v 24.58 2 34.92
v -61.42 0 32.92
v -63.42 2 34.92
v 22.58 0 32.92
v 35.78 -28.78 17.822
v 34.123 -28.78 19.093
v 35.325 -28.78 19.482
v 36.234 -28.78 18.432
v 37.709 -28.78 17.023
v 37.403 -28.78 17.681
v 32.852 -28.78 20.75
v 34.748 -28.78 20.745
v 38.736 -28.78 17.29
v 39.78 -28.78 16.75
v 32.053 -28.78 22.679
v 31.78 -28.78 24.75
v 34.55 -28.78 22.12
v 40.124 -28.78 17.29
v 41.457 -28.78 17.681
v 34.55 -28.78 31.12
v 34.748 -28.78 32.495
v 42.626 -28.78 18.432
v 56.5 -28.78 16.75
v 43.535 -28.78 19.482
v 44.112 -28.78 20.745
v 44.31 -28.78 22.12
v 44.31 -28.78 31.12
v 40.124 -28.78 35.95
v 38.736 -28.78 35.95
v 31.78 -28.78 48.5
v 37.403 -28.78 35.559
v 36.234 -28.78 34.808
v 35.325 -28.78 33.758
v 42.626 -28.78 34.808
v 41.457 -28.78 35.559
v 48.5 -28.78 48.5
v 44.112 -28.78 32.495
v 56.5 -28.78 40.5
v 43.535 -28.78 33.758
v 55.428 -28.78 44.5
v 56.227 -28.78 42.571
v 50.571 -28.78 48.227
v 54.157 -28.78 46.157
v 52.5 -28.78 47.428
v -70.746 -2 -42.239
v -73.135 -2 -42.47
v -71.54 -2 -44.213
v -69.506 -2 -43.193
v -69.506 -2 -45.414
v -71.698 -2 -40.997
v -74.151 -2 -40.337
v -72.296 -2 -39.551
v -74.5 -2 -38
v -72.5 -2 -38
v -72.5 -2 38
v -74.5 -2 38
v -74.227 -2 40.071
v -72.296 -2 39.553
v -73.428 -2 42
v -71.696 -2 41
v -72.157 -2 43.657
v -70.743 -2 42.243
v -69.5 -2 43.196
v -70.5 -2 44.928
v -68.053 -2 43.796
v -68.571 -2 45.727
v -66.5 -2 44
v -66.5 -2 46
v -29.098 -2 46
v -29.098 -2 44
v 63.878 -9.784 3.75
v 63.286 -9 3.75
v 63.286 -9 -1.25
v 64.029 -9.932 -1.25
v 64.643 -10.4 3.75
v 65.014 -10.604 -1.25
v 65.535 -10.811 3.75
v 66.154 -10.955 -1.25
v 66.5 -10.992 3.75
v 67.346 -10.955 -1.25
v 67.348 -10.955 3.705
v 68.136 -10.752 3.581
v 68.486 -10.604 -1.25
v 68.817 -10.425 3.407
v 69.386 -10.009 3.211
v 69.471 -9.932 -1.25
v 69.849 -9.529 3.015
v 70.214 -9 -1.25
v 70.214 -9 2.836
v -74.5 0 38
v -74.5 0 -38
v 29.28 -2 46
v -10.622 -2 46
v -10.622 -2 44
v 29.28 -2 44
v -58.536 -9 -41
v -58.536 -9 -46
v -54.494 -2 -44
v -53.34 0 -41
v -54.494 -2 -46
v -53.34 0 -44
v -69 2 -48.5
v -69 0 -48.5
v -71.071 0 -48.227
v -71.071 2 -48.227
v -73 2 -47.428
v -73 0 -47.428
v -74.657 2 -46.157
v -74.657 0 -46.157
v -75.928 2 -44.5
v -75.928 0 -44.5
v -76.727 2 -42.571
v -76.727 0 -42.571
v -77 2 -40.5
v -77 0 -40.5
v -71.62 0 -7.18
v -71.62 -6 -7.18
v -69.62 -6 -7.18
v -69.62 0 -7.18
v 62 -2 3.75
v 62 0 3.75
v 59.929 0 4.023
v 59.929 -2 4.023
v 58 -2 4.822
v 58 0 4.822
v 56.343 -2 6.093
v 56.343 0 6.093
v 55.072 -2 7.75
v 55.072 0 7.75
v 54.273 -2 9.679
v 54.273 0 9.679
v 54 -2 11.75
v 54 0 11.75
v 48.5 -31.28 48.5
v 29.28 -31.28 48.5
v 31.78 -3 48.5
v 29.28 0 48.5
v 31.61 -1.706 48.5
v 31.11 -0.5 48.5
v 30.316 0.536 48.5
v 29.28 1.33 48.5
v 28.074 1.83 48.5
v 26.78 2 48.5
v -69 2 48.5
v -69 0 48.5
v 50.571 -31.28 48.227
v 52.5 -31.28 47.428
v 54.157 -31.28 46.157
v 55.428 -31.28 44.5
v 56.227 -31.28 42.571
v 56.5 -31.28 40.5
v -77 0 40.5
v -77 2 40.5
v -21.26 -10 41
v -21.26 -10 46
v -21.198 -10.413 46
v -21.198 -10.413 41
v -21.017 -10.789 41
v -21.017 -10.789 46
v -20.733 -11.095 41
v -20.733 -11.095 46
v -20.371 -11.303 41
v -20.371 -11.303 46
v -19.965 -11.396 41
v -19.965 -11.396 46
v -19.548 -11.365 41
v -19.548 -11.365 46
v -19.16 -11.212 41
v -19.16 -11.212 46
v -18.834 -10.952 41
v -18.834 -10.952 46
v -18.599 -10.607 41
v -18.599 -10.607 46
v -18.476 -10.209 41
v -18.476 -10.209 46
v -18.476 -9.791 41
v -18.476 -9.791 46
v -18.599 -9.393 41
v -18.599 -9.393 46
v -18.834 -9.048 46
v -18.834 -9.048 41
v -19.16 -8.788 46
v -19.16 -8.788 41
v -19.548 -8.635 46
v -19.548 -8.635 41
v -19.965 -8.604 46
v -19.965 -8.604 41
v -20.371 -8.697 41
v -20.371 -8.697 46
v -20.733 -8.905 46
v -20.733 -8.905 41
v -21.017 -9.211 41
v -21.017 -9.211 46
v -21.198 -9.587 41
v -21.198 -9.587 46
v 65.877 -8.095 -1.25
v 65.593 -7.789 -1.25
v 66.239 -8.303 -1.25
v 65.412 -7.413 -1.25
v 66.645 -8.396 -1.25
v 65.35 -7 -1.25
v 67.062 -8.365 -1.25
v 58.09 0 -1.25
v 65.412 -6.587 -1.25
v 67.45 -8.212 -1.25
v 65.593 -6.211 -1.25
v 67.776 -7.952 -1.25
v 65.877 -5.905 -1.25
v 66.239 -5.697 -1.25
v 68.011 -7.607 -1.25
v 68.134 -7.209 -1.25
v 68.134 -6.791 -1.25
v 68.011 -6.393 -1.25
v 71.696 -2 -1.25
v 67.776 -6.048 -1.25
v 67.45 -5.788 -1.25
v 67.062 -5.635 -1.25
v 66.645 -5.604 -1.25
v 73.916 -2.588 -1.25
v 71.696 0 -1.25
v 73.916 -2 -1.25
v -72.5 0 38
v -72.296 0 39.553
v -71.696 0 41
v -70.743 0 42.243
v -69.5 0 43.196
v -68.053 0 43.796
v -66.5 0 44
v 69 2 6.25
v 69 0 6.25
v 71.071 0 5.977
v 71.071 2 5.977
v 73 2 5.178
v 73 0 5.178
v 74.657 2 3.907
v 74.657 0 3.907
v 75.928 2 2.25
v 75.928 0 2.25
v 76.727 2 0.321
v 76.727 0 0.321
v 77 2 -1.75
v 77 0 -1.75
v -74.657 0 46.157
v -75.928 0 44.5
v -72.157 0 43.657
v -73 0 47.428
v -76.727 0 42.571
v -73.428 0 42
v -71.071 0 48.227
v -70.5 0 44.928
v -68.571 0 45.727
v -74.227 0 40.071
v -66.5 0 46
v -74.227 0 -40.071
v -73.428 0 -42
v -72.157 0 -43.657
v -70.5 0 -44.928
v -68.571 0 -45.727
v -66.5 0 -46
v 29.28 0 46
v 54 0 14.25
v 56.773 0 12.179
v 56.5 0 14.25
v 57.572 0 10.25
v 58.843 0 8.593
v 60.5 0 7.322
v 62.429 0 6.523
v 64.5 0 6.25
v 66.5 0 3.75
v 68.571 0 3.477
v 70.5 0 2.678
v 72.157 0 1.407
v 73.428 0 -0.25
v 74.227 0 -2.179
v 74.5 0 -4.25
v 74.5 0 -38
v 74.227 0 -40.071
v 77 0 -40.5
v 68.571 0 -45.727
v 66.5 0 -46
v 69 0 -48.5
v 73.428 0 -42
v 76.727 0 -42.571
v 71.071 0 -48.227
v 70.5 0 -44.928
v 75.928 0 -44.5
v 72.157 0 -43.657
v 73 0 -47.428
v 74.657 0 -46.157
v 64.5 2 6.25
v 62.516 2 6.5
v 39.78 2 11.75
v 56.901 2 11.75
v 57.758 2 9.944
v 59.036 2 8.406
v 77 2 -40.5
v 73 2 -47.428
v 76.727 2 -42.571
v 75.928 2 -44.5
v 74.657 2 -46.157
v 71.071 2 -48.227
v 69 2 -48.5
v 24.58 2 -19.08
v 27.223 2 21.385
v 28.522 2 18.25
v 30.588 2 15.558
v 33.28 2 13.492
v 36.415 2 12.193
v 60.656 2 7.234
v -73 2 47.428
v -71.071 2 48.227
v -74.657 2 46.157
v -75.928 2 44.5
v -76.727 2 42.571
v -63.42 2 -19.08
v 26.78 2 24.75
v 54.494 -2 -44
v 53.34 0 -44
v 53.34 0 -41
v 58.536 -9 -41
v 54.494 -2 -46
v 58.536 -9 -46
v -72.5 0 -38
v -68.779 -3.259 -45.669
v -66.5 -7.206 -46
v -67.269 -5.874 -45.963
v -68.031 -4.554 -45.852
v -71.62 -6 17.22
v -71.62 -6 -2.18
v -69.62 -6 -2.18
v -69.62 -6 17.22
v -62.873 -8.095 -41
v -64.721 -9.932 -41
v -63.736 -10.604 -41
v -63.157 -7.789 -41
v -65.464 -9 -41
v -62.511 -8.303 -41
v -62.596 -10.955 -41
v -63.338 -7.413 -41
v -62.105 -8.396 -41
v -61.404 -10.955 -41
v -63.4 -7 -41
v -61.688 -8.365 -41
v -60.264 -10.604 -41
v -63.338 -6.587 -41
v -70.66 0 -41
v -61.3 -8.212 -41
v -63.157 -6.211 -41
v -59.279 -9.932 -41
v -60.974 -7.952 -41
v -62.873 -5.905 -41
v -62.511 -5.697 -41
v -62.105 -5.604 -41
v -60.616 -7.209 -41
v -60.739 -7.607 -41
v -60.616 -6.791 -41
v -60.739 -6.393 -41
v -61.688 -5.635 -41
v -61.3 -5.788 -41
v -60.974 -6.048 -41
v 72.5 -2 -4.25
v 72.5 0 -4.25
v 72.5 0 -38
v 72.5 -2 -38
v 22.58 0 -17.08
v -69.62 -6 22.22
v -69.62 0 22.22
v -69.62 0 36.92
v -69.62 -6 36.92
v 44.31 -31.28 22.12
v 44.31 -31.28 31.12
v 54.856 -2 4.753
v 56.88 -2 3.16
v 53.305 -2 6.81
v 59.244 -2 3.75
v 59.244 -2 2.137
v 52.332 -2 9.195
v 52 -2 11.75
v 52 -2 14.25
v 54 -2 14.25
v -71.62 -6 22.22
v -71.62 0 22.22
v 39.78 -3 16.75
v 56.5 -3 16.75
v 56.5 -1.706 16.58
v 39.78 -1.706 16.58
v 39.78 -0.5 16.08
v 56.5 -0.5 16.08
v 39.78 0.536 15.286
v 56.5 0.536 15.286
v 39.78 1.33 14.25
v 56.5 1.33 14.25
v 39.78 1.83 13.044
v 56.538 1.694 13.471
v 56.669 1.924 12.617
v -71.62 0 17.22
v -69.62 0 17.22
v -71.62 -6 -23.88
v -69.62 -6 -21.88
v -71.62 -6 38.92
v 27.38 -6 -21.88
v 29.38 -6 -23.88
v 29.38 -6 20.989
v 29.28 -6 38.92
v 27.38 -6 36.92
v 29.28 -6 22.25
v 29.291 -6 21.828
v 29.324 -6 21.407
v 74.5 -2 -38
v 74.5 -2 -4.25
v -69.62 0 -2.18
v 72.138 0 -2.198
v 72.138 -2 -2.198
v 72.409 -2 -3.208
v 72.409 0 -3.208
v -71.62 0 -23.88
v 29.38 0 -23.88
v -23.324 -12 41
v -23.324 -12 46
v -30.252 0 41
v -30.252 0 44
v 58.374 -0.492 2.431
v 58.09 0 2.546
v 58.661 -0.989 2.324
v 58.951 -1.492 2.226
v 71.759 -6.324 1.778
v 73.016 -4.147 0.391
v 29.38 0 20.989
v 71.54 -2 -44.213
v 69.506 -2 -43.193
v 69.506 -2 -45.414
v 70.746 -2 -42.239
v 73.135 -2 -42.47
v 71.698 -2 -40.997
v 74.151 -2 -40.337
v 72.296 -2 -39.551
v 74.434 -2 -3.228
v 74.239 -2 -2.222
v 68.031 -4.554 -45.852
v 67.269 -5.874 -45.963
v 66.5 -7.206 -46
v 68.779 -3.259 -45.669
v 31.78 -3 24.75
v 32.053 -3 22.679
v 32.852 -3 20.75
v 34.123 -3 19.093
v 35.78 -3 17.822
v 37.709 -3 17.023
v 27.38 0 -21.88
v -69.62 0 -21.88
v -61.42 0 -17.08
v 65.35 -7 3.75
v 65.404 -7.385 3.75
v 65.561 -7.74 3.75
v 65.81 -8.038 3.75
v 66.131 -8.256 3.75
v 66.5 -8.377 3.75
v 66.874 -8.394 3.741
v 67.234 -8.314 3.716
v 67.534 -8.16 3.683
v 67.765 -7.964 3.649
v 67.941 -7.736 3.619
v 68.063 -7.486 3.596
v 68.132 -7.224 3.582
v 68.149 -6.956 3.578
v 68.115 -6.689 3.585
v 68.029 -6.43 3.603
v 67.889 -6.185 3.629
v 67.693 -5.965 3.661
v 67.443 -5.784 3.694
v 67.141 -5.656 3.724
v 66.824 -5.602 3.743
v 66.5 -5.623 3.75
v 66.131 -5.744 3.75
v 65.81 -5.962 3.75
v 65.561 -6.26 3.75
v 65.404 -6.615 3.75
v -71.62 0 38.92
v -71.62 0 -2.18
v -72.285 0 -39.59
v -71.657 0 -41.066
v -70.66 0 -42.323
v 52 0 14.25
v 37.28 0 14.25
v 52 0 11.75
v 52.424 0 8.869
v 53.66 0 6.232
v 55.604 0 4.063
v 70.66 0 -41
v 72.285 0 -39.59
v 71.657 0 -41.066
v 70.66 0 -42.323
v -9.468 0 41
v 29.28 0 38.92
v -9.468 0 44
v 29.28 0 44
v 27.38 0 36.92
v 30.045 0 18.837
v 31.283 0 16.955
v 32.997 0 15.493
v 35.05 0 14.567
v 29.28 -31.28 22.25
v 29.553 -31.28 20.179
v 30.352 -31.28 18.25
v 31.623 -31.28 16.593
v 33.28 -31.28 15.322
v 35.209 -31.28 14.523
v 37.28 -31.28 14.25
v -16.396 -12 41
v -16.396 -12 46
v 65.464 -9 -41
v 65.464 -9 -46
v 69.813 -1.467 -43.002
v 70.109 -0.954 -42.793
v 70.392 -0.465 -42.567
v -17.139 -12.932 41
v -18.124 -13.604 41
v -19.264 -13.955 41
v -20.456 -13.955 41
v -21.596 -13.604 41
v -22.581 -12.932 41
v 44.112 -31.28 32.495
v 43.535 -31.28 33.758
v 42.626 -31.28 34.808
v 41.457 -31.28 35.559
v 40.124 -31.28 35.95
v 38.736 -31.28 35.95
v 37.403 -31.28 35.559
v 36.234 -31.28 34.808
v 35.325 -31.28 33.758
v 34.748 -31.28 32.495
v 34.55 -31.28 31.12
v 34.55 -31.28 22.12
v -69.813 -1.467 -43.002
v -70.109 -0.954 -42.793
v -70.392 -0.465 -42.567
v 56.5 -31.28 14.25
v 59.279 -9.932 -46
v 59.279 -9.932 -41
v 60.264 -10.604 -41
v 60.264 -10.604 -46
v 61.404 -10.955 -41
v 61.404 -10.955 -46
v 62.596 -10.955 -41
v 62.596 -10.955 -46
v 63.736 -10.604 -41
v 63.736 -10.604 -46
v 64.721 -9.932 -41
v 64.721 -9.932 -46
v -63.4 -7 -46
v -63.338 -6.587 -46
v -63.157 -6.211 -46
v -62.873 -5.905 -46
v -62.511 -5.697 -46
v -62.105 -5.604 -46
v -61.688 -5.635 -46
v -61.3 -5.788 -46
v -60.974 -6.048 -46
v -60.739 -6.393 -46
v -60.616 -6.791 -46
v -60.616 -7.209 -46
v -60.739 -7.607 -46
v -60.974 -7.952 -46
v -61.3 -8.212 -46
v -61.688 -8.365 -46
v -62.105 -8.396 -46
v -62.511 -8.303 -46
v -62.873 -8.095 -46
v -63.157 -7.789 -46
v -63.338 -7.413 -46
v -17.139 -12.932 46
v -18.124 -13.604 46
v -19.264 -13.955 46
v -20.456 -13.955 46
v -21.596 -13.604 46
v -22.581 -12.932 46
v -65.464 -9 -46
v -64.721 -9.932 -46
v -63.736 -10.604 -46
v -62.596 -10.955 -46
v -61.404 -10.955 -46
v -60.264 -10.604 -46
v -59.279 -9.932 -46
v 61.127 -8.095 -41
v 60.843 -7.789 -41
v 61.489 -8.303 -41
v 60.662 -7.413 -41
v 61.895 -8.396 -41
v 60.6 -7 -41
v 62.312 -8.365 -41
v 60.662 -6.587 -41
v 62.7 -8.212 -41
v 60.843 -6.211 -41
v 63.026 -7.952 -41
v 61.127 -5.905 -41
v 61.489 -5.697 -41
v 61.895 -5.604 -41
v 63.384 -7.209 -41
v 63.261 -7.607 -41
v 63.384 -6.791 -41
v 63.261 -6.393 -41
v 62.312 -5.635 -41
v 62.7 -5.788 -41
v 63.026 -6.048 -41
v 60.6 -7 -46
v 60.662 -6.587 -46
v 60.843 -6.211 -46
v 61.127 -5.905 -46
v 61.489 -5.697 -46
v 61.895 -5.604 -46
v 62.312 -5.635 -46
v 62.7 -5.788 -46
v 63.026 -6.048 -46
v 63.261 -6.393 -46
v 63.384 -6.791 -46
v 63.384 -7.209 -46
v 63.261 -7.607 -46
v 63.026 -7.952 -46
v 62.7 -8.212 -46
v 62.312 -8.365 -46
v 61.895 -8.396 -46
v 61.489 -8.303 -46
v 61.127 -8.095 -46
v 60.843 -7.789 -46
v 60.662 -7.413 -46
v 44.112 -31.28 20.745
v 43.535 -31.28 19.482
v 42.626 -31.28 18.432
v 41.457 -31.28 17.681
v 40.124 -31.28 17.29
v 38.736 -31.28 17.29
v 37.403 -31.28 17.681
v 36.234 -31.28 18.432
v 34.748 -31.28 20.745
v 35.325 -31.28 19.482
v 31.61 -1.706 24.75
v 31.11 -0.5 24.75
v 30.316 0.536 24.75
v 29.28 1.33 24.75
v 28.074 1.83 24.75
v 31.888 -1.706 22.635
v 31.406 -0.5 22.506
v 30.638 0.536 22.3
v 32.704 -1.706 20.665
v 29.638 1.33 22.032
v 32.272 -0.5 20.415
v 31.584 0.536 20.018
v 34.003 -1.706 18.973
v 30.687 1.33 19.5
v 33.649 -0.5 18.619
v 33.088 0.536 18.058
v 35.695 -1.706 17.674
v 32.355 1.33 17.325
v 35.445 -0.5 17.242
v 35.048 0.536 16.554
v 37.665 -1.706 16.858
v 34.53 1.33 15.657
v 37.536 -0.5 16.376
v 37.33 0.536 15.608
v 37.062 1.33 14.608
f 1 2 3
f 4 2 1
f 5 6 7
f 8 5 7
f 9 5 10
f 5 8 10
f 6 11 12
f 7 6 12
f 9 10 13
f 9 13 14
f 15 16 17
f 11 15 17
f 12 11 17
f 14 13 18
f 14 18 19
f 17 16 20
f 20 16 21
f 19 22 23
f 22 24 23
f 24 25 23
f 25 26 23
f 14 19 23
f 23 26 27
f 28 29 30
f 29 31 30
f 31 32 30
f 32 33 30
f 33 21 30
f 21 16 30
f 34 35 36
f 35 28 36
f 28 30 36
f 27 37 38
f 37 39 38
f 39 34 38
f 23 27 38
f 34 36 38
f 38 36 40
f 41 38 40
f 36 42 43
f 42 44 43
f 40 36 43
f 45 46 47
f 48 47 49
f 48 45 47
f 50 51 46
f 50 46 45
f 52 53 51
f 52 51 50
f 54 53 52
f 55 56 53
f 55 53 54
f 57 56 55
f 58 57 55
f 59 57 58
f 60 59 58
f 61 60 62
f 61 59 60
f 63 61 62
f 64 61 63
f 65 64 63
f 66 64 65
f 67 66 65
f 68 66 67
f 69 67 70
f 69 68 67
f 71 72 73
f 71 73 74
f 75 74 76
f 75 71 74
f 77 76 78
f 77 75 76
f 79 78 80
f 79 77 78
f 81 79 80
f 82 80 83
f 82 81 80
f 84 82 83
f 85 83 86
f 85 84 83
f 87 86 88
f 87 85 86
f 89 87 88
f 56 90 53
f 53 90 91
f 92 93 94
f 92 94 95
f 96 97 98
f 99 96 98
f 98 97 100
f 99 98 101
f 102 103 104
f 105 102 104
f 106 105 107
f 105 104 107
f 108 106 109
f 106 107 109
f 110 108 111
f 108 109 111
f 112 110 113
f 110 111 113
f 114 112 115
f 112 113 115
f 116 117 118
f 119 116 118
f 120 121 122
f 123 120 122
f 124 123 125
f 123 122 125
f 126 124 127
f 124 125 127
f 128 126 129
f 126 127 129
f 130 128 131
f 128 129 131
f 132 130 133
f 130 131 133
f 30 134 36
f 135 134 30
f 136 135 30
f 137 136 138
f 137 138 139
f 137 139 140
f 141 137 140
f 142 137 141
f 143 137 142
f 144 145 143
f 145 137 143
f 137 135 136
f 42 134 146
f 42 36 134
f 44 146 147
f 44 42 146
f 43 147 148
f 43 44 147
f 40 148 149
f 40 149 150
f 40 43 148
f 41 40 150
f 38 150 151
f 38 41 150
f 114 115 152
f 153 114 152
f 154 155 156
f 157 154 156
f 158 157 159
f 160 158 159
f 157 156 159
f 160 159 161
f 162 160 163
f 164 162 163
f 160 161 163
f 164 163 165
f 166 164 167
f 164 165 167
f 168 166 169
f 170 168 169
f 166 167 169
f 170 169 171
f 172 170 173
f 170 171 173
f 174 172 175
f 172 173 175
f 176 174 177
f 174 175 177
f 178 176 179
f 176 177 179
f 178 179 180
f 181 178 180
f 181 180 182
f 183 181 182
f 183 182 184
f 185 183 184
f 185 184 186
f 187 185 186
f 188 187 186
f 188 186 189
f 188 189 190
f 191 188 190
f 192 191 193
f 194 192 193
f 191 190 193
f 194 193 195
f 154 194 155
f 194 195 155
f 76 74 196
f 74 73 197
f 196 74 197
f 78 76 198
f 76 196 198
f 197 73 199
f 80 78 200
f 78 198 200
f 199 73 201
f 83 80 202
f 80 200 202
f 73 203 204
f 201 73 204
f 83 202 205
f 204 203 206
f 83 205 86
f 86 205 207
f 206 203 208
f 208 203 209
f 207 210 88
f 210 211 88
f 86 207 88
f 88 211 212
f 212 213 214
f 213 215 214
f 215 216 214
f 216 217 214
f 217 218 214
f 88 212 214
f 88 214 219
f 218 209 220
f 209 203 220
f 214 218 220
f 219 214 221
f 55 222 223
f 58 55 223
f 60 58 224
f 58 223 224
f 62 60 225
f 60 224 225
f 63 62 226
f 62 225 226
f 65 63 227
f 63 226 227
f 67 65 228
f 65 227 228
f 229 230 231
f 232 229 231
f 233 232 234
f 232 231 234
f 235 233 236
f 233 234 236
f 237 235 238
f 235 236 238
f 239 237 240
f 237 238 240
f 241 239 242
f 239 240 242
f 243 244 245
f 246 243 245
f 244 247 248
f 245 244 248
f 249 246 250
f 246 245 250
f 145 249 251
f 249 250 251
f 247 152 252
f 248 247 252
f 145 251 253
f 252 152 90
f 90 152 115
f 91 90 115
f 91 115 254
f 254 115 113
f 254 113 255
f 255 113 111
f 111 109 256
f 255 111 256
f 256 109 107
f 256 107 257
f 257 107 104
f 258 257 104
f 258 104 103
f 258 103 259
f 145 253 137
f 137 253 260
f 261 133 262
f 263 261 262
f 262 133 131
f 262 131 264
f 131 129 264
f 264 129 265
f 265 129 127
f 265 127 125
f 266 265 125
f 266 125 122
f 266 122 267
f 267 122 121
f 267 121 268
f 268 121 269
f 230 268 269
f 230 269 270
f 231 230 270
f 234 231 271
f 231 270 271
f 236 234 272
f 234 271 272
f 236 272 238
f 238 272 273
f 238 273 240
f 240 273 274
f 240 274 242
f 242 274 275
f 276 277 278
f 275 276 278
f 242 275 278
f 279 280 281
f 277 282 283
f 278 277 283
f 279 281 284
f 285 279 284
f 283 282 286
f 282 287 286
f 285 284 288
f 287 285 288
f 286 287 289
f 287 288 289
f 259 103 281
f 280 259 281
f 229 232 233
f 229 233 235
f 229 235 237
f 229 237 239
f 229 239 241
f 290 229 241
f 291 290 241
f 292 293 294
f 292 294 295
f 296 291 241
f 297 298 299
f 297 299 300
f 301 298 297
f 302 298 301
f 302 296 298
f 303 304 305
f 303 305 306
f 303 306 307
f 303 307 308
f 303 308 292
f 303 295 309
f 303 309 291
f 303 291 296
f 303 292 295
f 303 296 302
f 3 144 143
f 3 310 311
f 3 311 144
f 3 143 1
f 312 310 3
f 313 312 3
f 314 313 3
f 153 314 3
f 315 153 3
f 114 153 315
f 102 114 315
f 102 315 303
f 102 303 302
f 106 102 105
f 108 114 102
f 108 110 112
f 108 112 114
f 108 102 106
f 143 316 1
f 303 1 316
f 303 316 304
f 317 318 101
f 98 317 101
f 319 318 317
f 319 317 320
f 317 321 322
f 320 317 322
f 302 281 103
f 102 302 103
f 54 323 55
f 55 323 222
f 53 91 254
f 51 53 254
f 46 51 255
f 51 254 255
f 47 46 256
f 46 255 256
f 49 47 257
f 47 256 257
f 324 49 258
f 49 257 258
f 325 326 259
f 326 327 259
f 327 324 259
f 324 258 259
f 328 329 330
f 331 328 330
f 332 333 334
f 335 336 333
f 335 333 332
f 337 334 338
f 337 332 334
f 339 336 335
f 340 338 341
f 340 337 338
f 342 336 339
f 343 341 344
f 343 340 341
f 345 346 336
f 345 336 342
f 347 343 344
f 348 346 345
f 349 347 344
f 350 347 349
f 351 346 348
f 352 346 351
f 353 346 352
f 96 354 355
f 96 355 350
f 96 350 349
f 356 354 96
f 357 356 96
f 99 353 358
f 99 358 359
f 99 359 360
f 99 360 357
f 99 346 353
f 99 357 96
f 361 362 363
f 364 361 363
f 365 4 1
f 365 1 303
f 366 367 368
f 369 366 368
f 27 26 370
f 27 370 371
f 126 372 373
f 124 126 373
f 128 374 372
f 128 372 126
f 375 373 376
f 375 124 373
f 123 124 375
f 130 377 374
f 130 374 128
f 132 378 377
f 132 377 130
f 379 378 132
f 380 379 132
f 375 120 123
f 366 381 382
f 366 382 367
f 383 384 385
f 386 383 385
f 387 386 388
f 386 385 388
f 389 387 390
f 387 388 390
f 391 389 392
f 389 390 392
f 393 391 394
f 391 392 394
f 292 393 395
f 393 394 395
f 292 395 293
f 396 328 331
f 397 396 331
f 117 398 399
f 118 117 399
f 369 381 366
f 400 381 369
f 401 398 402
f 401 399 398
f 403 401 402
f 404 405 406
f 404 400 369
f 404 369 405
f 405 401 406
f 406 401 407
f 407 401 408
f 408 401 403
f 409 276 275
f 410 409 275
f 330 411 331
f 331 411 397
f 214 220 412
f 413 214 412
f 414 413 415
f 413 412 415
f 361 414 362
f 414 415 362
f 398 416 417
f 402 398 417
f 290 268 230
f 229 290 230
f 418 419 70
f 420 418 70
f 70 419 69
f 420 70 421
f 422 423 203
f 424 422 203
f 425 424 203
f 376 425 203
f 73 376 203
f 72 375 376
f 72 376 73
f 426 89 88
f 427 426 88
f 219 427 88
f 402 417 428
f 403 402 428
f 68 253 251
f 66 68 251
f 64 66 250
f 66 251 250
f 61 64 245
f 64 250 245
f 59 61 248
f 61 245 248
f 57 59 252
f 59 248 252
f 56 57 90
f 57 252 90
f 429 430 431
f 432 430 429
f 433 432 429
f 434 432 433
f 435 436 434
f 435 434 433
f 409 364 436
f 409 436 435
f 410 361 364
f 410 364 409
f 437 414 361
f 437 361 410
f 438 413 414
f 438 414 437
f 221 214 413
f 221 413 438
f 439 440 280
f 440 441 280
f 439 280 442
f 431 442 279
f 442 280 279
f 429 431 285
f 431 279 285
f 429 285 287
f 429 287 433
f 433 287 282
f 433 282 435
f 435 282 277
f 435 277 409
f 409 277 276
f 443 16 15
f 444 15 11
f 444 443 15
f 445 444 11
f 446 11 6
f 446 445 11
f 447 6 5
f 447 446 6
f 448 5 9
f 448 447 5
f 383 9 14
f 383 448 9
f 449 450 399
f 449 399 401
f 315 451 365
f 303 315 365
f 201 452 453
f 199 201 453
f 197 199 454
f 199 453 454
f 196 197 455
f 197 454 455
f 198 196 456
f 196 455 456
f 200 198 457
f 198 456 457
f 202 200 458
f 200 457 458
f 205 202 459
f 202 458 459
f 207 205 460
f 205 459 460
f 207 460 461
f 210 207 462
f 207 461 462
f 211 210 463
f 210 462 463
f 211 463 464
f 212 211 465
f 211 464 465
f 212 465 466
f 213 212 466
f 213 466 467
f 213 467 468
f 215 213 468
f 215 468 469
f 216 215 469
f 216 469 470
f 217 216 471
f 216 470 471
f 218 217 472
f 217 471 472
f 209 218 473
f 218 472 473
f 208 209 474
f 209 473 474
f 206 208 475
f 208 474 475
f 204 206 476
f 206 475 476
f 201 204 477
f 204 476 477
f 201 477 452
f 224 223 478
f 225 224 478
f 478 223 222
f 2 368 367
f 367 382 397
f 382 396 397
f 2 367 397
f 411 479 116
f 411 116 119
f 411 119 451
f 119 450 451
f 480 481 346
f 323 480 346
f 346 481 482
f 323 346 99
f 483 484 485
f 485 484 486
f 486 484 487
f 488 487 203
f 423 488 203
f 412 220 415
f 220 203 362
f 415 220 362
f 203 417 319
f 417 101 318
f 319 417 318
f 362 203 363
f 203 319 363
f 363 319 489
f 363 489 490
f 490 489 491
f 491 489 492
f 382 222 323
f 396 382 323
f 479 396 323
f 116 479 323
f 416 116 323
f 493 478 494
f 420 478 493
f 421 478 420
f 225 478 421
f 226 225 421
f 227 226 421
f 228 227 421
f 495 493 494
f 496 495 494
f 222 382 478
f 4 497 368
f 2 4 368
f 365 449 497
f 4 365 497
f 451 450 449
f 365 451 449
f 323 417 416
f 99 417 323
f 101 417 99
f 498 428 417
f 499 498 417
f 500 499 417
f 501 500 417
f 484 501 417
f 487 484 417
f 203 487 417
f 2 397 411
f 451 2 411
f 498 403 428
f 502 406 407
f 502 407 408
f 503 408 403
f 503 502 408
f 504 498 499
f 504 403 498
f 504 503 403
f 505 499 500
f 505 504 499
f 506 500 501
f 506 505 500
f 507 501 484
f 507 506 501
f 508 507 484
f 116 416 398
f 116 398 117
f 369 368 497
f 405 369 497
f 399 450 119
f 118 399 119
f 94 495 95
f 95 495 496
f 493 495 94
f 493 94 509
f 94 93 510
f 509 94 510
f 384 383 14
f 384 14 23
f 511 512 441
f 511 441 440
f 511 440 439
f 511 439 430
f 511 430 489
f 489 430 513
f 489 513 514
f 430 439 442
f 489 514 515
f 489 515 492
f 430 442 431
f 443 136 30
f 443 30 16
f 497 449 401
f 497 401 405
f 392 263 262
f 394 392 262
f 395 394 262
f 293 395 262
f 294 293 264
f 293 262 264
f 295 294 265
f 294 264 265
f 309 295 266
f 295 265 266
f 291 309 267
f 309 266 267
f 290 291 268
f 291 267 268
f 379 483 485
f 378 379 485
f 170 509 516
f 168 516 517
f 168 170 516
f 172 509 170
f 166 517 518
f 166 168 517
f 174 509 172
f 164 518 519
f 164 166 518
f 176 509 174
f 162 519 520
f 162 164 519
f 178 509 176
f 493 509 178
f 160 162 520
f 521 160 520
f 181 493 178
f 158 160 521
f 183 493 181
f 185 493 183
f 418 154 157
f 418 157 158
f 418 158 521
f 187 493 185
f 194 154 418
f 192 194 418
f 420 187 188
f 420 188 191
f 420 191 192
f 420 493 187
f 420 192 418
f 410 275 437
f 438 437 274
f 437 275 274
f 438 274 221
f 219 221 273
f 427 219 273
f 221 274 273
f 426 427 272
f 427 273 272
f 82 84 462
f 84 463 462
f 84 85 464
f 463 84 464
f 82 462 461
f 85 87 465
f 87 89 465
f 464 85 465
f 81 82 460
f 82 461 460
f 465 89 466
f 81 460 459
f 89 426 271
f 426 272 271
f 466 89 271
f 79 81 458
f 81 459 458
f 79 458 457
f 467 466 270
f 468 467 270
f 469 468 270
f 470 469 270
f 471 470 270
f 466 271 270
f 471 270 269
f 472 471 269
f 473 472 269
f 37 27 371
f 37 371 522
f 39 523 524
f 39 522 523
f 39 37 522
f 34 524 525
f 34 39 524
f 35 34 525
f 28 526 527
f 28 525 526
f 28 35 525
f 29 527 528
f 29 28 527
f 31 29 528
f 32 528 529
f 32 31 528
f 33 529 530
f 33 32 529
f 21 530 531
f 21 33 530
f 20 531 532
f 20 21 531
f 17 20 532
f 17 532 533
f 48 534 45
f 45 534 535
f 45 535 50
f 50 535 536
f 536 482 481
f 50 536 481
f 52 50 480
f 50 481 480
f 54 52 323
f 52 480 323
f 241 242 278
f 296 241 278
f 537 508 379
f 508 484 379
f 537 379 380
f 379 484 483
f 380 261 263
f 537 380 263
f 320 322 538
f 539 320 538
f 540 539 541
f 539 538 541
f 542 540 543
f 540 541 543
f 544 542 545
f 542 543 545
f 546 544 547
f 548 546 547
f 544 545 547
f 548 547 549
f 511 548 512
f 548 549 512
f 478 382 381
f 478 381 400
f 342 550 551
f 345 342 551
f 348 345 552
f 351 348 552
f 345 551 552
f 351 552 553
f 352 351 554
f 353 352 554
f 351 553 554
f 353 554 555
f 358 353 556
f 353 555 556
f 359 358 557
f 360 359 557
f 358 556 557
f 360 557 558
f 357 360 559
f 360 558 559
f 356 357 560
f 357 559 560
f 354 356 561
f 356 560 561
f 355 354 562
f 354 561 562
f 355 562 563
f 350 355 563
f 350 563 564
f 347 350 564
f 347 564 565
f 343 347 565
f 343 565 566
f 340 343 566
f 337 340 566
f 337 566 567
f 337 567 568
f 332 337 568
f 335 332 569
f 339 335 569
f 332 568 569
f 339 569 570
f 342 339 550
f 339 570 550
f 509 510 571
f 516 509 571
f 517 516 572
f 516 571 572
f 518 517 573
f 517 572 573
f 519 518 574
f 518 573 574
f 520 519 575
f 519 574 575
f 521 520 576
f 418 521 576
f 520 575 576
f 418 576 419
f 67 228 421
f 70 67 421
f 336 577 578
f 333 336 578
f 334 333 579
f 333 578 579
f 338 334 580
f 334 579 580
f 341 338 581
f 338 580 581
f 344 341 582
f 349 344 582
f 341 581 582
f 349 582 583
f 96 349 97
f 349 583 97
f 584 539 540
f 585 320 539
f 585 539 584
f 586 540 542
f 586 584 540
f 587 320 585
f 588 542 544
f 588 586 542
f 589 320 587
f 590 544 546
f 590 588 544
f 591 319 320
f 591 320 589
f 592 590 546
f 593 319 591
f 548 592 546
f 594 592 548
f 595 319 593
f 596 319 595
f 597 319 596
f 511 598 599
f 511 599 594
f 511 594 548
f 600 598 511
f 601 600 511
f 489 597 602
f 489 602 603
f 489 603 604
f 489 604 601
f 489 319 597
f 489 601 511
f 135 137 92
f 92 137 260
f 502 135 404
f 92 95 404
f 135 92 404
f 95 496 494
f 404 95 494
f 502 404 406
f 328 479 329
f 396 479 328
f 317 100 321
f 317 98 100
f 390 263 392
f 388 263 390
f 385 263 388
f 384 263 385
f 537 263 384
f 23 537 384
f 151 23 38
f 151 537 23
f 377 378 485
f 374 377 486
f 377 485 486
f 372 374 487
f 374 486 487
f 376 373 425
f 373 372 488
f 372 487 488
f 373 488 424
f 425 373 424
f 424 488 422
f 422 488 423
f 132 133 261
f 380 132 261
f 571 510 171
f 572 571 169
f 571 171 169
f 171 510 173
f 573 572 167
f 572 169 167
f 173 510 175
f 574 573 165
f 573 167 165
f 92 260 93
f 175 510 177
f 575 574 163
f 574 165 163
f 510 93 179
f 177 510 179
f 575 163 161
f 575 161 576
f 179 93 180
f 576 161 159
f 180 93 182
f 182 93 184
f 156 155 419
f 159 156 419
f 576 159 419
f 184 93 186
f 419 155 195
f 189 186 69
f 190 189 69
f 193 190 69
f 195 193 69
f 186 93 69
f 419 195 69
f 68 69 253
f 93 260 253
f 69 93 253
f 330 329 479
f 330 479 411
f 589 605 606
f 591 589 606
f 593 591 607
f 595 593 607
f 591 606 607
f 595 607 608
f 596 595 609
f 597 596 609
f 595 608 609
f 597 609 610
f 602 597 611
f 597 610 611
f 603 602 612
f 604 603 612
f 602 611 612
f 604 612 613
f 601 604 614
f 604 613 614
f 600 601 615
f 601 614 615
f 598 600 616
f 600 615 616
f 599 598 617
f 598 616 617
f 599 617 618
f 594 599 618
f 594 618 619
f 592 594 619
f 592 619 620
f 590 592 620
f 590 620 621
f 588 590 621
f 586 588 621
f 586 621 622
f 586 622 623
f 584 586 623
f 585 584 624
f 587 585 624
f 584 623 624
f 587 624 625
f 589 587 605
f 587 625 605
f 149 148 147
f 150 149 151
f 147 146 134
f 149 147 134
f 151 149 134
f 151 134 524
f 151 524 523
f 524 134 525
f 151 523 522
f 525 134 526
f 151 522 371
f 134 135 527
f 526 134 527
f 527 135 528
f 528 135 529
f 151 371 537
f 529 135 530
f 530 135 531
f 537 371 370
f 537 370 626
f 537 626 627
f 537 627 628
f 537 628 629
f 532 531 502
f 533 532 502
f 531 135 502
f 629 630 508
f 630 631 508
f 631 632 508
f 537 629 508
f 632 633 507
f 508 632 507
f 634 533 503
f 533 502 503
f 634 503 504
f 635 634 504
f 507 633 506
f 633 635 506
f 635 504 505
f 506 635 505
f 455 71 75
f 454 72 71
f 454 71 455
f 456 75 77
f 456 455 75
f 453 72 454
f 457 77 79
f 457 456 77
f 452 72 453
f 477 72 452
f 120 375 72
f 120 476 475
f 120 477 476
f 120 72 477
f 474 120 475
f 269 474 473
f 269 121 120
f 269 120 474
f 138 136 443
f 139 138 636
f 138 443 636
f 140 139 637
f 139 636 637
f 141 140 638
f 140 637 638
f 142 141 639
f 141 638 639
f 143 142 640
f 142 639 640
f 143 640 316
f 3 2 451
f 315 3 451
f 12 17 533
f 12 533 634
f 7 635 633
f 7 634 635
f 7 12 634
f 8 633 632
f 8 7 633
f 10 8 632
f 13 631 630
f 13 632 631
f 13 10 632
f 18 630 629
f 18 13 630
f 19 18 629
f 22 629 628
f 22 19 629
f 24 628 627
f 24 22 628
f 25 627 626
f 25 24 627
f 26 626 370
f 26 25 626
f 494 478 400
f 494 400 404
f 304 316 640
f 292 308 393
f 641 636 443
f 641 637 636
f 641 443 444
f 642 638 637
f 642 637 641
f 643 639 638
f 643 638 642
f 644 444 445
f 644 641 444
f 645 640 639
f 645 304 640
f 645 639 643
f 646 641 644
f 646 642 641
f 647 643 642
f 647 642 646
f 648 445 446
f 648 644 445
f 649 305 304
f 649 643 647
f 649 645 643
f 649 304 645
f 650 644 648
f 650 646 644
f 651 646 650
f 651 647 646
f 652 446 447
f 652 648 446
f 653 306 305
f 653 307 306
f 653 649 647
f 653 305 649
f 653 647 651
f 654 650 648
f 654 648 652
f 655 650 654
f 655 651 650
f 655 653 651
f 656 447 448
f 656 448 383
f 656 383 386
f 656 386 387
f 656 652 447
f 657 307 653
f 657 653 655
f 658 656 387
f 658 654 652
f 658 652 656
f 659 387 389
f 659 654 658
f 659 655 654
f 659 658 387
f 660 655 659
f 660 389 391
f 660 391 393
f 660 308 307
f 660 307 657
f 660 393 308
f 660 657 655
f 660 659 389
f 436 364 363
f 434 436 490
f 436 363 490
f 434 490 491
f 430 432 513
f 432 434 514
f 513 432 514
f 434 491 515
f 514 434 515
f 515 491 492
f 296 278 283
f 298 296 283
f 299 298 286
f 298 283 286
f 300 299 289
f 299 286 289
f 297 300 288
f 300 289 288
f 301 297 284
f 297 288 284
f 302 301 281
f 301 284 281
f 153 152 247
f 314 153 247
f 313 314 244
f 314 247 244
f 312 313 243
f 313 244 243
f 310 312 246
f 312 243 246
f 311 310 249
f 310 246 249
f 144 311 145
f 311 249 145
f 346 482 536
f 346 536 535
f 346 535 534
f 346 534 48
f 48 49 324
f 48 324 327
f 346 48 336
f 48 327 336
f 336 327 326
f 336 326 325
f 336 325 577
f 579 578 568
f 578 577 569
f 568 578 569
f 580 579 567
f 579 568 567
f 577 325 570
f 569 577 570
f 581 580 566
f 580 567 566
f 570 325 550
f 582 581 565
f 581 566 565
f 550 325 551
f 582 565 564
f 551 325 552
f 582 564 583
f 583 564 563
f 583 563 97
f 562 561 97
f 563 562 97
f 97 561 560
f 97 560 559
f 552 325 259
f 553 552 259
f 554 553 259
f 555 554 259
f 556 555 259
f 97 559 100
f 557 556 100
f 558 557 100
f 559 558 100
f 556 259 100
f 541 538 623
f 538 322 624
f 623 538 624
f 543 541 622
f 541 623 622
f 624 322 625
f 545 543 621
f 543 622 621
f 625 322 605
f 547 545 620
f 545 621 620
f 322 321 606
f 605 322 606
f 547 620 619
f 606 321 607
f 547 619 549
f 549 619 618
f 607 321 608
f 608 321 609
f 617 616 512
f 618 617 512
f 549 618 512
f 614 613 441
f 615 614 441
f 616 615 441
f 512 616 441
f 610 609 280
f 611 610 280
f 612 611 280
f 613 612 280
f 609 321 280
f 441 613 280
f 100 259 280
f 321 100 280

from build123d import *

# Parameters (mm, degrees)
BOSS_EXTRUDE1_DEPTH = 2
BOSS_EXTRUDE2_DEPTH = 2
SKETCH3_W           = 27.22
SKETCH3_H           = 33.28
BOSS_EXTRUDE3_DEPTH = 2.5
SKETCH4_W           = 31.75
SKETCH4_H           = 33.28
BOSS_EXTRUDE4_DEPTH = 2.5
SKETCH5_W           = 27.22
SKETCH5_H           = 34.25
BOSS_EXTRUDE5_DEPTH = 2.5
FILLET1_R           = 8
CUT_EXTRUDE1_REACH  = 98.066
FILLET3_R           = 8
FILLET6_R           = 5
SKETCH7_W           = 101
SKETCH7_H           = 62.8
SKETCH7_W_2         = 97
SKETCH7_H_2         = 58.8
BOSS_EXTRUDE6_DEPTH = 6
CUT_EXTRUDE2_REACH  = 98.896
SKETCH8_W           = 84
SKETCH8_H           = 50
CHAMFER1_SIZE       = 2
BOSS_EXTRUDE7_START = -2.5
SKETCH9_R           = 1.4
BOSS_EXTRUDE7_DEPTH = 5
BOSS_EXTRUDE8_START = 3.75
SKETCH10_R          = 1.4
BOSS_EXTRUDE8_DEPTH = 5
SKETCH11_R          = 1.4
BOSS_EXTRUDE9_DEPTH = 5
CUT_EXTRUDE3_DEPTH  = 97.22727472
SKETCH13_W          = 2
SKETCH13_H          = 5
CUT_EXTRUDE4_DEPTH  = 6


with BuildPart() as part:
    # Sketch1 → Boss-Extrude1 (new body)
    with BuildSketch(Plane(origin=(0, 0, 0), x_dir=(1, 0, 0), z_dir=(0, 1, 0))):
        with BuildLine():
            Line((-77, 40.5), (-77, -40.5))
            ThreePointArc((-77, -40.5), (-74.656854249, -46.156854249), (-69, -48.5))
            Line((-69, -48.5), (29.28, -48.5))
            Line((29.28, -48.5), (29.28, -46))
            Line((29.28, -46), (29.28, -14.25))
            Line((29.28, -14.25), (54, -14.25))
            Line((54, -14.25), (56.5, -14.25))
            ThreePointArc((56.5, -14.25), (58.843145751, -8.593145751), (64.5, -6.25))
            Line((64.5, -6.25), (69, -6.25))
            ThreePointArc((69, -6.25), (74.656854249, -3.906854249), (77, 1.75))
            Line((77, 1.75), (77, 40.5))
            ThreePointArc((77, 40.5), (74.656854249, 46.156854249), (69, 48.5))
            Line((69, 48.5), (-69, 48.5))
            ThreePointArc((-69, 48.5), (-74.656854249, 46.156854249), (-77, 40.5))
        make_face()
    extrude(amount=BOSS_EXTRUDE1_DEPTH)

    # Sketch2 → Boss-Extrude2 (add)
    with BuildSketch(Plane.XZ):
        with BuildLine():
            Line((54, 11.75), (54, 14.25))
            Line((54, 14.25), (52, 14.25))
            Line((52, 14.25), (52, 11.75))
            ThreePointArc((52, 11.75), (54.928932188, 4.678932188), (62, 1.75))
            Line((62, 1.75), (66.5, 1.75))
            ThreePointArc((66.5, 1.75), (70.742640687, -0.007359313), (72.5, -4.25))
            Line((72.5, -4.25), (72.5, -38))
            ThreePointArc((72.5, -38), (70.742640687, -42.242640687), (66.5, -44))
            Line((66.5, -44), (-66.5, -44))
            ThreePointArc((-66.5, -44), (-70.742640687, -42.242640687), (-72.5, -38))
            Line((-72.5, -38), (-72.5, 38))
            ThreePointArc((-72.5, 38), (-70.742640687, 42.242640687), (-66.5, 44))
            Line((-66.5, 44), (29.28, 44))
            Line((29.28, 44), (29.28, 46))
            Line((29.28, 46), (-66.5, 46))
            ThreePointArc((-66.5, 46), (-72.156854249, 43.656854249), (-74.5, 38))
            Line((-74.5, 38), (-74.5, -38))
            ThreePointArc((-74.5, -38), (-72.156854249, -43.656854249), (-66.5, -46))
            Line((-66.5, -46), (66.5, -46))
            ThreePointArc((66.5, -46), (72.156854249, -43.656854249), (74.5, -38))
            Line((74.5, -38), (74.5, -4.25))
            ThreePointArc((74.5, -4.25), (72.156854249, 1.406854249), (66.5, 3.75))
            Line((66.5, 3.75), (62, 3.75))
            ThreePointArc((62, 3.75), (56.343145751, 6.093145751), (54, 11.75))
        make_face()
    extrude(amount=BOSS_EXTRUDE2_DEPTH)

    # Sketch3 → Boss-Extrude3 (add)
    with BuildSketch(Plane.XY.offset(14.25)):
        with Locations((42.89, -14.64)):
            Rectangle(SKETCH3_W, SKETCH3_H)
    extrude(amount=BOSS_EXTRUDE3_DEPTH)

    # Sketch4 → Boss-Extrude4 (add)
    with BuildSketch(Plane(origin=(29.28, 0, 0), x_dir=(0, 0, -1), z_dir=(1, 0, 0))):
        with Locations((-32.625, -14.64)):
            Rectangle(SKETCH4_W, SKETCH4_H)
    extrude(amount=BOSS_EXTRUDE4_DEPTH)

    # Sketch5 → Boss-Extrude5 (add)
    with BuildSketch(Plane.XZ.offset(31.28)):
        with Locations((42.89, 31.375)):
            Rectangle(SKETCH5_W, SKETCH5_H)
    extrude(amount=-BOSS_EXTRUDE5_DEPTH)

    # Fillet1
    fillet1_edges = [part.edges().sort_by_distance(p)[0] for p in [
        (56.5, -30.03, 48.5),
    ]]
    fillet(fillet1_edges, radius=FILLET1_R)

    # Sketch6 → Cut-Extrude1 (cut, up to next)
    with BuildSketch(Plane(origin=(0, -28.78, 0), x_dir=(1, 0, 0), z_dir=(0, 1, 0)), mode=Mode.PRIVATE) as cut_extrude1_sk1:
        with BuildLine():
            Line((44.31, -22.12), (44.31, -31.12))
            ThreePointArc((44.31, -31.12), (39.43, -36), (34.55, -31.12))
            Line((34.55, -31.12), (34.55, -22.12))
            ThreePointArc((34.55, -22.12), (39.43, -17.24), (44.31, -22.12))
        make_face()
    cut_extrude1_tool1 = extrude(cut_extrude1_sk1.sketch, amount=-CUT_EXTRUDE1_REACH, mode=Mode.PRIVATE) & part.part
    add(cut_extrude1_tool1.solids().sort_by_distance((39.43, -28.78, 26.62))[0], mode=Mode.SUBTRACT)

    # Fillet3
    fillet3_edges = [part.edges().sort_by_distance(p)[0] for p in [
        (29.28, -15.64, 14.25),
        (31.78, -13.39, 16.75),
    ]]
    fillet(fillet3_edges, radius=FILLET3_R)

    # Fillet6
    fillet6_edges = [part.edges().sort_by_distance(p)[0] for p in [
        (31.78, 2, 36.625),
        (34.123145751, 2, 19.093145751),
        (48.14, 2, 16.75),
    ]]
    fillet(fillet6_edges, radius=FILLET6_R)

    # Sketch7 → Boss-Extrude6 (add)
    with BuildSketch(Plane.XZ):
        with Locations((-21.12, 7.52)):
            Rectangle(SKETCH7_W, SKETCH7_H)
        with Locations((-21.12, 7.52)):
            Rectangle(SKETCH7_W_2, SKETCH7_H_2, mode=Mode.SUBTRACT)
    extrude(amount=BOSS_EXTRUDE6_DEPTH)

    # Sketch8 → Cut-Extrude2 (cut, up to next)
    with BuildSketch(Plane(origin=(0, 2, 0), x_dir=(1, 0, 0), z_dir=(0, 1, 0)), mode=Mode.PRIVATE) as cut_extrude2_sk1:
        with Locations((-19.42, -7.92)):
            Rectangle(SKETCH8_W, SKETCH8_H)
    cut_extrude2_tool1 = extrude(cut_extrude2_sk1.sketch, amount=-CUT_EXTRUDE2_REACH, mode=Mode.PRIVATE) & part.part
    add(cut_extrude2_tool1.solids().sort_by_distance((-19.42, 2, 7.92))[0], mode=Mode.SUBTRACT)

    # Chamfer1
    chamfer1_edges = [part.edges().sort_by_distance(p)[0] for p in [
        (-19.42, 2, 32.92),
        (-61.42, 2, 7.92),
        (-19.42, 2, -17.08),
        (22.58, 2, 7.92),
    ]]
    chamfer(chamfer1_edges, length=CHAMFER1_SIZE - 0.0001)  # a hair under: the kernel refuses the full size

    # Sketch9 → Boss-Extrude7 (add)
    with BuildSketch(Plane.XY.offset(48.5).offset(BOSS_EXTRUDE7_START)):
        with BuildLine():
            Line((-23.324101615, -12), (-30.252304845, 0))
            Line((-30.252304845, 0), (-9.467695155, 0))
            Line((-9.467695155, 0), (-16.395898385, -12))
            ThreePointArc((-16.395898385, -12), (-19.86, -14), (-23.324101615, -12))
        make_face()
        with Locations(Location((-19.86, -10, 0), (0, 0, 180))):
            Circle(SKETCH9_R, mode=Mode.SUBTRACT)
    extrude(amount=-BOSS_EXTRUDE7_DEPTH)

    # Sketch10 → Boss-Extrude8 (add)
    with BuildSketch(Plane.XY.offset(BOSS_EXTRUDE8_START)):
        with BuildLine():
            Line((70.214101615, -9), (75.410254038, 0))
            Line((75.410254038, 0), (58.089745962, 0))
            Line((58.089745962, 0), (63.285898385, -9))
            ThreePointArc((63.285898385, -9), (66.75, -11), (70.214101615, -9))
        make_face()
        with Locations(Location((66.75, -7, 0), (0, 0, 180))):
            Circle(SKETCH10_R, mode=Mode.SUBTRACT)
    extrude(amount=-BOSS_EXTRUDE8_DEPTH)

    # Sketch11 → Boss-Extrude9 (add)
    # profile 1 of 2: a face of its own
    with BuildSketch(Plane(origin=(0, 0, -46), x_dir=(-1, 0, 0), z_dir=(0, 0, -1))):
        with BuildLine():
            Line((-65.464101615, -9), (-70.660254038, 0))
            Line((-70.660254038, 0), (-53.339745962, 0))
            Line((-53.339745962, 0), (-58.535898385, -9))
            ThreePointArc((-58.535898385, -9), (-62, -11), (-65.464101615, -9))
        make_face()
        with Locations((-62, -7)):
            Circle(SKETCH11_R, mode=Mode.SUBTRACT)
    # profile 2 of 2: a face of its own
    with BuildSketch(Plane(origin=(0, 0, -46), x_dir=(-1, 0, 0), z_dir=(0, 0, -1))):
        with BuildLine():
            Line((58.535898385, -9), (53.339745962, 0))
            Line((53.339745962, 0), (70.660254038, 0))
            Line((70.660254038, 0), (65.464101615, -9))
            ThreePointArc((65.464101615, -9), (62, -11), (58.535898385, -9))
        make_face()
        with Locations((62, -7)):
            Circle(SKETCH11_R, mode=Mode.SUBTRACT)
    extrude(amount=-BOSS_EXTRUDE9_DEPTH)

    # Sketch12 → Cut-Extrude3 (cut, through all)
    with BuildSketch(Plane.XZ):
        with BuildLine():
            Line((-66.5, -46), (66.5, -46))
            ThreePointArc((66.5, -46), (72.156854249, -43.656854249), (74.5, -38))
            Line((74.5, -38), (84.295668918, -38))
            Line((84.295668918, -38), (84.295668918, -62.929633478))
            Line((84.295668918, -62.929633478), (-82.125682446, -61.467965399))
            Line((-82.125682446, -61.467965399), (-82.125682446, -38))
            Line((-82.125682446, -38), (-74.5, -38))
            ThreePointArc((-74.5, -38), (-72.156854249, -43.656854249), (-66.5, -46))
        make_face()
        with BuildLine():
            Line((66.5, 3.75), (62, 3.75))
            ThreePointArc((62, 3.75), (56.343145751, 6.093145751), (54, 11.75))
            Line((54, 11.75), (84.295668918, 11.75))
            Line((84.295668918, 11.75), (84.295668918, -4.25))
            Line((84.295668918, -4.25), (74.5, -4.25))
            ThreePointArc((74.5, -4.25), (72.156854249, 1.406854249), (66.5, 3.75))
        make_face()
    extrude(amount=CUT_EXTRUDE3_DEPTH, mode=Mode.SUBTRACT)

    # Sketch13 → Cut-Extrude4 (cut)
    with BuildSketch(Plane.XZ.offset(6)):
        with Locations((-70.62, 19.72)):
            Rectangle(SKETCH13_W, SKETCH13_H)
        with Locations((-70.62, -4.68)):
            Rectangle(SKETCH13_W, SKETCH13_H)
    extrude(amount=-CUT_EXTRUDE4_DEPTH, mode=Mode.SUBTRACT)


solid = part.part
